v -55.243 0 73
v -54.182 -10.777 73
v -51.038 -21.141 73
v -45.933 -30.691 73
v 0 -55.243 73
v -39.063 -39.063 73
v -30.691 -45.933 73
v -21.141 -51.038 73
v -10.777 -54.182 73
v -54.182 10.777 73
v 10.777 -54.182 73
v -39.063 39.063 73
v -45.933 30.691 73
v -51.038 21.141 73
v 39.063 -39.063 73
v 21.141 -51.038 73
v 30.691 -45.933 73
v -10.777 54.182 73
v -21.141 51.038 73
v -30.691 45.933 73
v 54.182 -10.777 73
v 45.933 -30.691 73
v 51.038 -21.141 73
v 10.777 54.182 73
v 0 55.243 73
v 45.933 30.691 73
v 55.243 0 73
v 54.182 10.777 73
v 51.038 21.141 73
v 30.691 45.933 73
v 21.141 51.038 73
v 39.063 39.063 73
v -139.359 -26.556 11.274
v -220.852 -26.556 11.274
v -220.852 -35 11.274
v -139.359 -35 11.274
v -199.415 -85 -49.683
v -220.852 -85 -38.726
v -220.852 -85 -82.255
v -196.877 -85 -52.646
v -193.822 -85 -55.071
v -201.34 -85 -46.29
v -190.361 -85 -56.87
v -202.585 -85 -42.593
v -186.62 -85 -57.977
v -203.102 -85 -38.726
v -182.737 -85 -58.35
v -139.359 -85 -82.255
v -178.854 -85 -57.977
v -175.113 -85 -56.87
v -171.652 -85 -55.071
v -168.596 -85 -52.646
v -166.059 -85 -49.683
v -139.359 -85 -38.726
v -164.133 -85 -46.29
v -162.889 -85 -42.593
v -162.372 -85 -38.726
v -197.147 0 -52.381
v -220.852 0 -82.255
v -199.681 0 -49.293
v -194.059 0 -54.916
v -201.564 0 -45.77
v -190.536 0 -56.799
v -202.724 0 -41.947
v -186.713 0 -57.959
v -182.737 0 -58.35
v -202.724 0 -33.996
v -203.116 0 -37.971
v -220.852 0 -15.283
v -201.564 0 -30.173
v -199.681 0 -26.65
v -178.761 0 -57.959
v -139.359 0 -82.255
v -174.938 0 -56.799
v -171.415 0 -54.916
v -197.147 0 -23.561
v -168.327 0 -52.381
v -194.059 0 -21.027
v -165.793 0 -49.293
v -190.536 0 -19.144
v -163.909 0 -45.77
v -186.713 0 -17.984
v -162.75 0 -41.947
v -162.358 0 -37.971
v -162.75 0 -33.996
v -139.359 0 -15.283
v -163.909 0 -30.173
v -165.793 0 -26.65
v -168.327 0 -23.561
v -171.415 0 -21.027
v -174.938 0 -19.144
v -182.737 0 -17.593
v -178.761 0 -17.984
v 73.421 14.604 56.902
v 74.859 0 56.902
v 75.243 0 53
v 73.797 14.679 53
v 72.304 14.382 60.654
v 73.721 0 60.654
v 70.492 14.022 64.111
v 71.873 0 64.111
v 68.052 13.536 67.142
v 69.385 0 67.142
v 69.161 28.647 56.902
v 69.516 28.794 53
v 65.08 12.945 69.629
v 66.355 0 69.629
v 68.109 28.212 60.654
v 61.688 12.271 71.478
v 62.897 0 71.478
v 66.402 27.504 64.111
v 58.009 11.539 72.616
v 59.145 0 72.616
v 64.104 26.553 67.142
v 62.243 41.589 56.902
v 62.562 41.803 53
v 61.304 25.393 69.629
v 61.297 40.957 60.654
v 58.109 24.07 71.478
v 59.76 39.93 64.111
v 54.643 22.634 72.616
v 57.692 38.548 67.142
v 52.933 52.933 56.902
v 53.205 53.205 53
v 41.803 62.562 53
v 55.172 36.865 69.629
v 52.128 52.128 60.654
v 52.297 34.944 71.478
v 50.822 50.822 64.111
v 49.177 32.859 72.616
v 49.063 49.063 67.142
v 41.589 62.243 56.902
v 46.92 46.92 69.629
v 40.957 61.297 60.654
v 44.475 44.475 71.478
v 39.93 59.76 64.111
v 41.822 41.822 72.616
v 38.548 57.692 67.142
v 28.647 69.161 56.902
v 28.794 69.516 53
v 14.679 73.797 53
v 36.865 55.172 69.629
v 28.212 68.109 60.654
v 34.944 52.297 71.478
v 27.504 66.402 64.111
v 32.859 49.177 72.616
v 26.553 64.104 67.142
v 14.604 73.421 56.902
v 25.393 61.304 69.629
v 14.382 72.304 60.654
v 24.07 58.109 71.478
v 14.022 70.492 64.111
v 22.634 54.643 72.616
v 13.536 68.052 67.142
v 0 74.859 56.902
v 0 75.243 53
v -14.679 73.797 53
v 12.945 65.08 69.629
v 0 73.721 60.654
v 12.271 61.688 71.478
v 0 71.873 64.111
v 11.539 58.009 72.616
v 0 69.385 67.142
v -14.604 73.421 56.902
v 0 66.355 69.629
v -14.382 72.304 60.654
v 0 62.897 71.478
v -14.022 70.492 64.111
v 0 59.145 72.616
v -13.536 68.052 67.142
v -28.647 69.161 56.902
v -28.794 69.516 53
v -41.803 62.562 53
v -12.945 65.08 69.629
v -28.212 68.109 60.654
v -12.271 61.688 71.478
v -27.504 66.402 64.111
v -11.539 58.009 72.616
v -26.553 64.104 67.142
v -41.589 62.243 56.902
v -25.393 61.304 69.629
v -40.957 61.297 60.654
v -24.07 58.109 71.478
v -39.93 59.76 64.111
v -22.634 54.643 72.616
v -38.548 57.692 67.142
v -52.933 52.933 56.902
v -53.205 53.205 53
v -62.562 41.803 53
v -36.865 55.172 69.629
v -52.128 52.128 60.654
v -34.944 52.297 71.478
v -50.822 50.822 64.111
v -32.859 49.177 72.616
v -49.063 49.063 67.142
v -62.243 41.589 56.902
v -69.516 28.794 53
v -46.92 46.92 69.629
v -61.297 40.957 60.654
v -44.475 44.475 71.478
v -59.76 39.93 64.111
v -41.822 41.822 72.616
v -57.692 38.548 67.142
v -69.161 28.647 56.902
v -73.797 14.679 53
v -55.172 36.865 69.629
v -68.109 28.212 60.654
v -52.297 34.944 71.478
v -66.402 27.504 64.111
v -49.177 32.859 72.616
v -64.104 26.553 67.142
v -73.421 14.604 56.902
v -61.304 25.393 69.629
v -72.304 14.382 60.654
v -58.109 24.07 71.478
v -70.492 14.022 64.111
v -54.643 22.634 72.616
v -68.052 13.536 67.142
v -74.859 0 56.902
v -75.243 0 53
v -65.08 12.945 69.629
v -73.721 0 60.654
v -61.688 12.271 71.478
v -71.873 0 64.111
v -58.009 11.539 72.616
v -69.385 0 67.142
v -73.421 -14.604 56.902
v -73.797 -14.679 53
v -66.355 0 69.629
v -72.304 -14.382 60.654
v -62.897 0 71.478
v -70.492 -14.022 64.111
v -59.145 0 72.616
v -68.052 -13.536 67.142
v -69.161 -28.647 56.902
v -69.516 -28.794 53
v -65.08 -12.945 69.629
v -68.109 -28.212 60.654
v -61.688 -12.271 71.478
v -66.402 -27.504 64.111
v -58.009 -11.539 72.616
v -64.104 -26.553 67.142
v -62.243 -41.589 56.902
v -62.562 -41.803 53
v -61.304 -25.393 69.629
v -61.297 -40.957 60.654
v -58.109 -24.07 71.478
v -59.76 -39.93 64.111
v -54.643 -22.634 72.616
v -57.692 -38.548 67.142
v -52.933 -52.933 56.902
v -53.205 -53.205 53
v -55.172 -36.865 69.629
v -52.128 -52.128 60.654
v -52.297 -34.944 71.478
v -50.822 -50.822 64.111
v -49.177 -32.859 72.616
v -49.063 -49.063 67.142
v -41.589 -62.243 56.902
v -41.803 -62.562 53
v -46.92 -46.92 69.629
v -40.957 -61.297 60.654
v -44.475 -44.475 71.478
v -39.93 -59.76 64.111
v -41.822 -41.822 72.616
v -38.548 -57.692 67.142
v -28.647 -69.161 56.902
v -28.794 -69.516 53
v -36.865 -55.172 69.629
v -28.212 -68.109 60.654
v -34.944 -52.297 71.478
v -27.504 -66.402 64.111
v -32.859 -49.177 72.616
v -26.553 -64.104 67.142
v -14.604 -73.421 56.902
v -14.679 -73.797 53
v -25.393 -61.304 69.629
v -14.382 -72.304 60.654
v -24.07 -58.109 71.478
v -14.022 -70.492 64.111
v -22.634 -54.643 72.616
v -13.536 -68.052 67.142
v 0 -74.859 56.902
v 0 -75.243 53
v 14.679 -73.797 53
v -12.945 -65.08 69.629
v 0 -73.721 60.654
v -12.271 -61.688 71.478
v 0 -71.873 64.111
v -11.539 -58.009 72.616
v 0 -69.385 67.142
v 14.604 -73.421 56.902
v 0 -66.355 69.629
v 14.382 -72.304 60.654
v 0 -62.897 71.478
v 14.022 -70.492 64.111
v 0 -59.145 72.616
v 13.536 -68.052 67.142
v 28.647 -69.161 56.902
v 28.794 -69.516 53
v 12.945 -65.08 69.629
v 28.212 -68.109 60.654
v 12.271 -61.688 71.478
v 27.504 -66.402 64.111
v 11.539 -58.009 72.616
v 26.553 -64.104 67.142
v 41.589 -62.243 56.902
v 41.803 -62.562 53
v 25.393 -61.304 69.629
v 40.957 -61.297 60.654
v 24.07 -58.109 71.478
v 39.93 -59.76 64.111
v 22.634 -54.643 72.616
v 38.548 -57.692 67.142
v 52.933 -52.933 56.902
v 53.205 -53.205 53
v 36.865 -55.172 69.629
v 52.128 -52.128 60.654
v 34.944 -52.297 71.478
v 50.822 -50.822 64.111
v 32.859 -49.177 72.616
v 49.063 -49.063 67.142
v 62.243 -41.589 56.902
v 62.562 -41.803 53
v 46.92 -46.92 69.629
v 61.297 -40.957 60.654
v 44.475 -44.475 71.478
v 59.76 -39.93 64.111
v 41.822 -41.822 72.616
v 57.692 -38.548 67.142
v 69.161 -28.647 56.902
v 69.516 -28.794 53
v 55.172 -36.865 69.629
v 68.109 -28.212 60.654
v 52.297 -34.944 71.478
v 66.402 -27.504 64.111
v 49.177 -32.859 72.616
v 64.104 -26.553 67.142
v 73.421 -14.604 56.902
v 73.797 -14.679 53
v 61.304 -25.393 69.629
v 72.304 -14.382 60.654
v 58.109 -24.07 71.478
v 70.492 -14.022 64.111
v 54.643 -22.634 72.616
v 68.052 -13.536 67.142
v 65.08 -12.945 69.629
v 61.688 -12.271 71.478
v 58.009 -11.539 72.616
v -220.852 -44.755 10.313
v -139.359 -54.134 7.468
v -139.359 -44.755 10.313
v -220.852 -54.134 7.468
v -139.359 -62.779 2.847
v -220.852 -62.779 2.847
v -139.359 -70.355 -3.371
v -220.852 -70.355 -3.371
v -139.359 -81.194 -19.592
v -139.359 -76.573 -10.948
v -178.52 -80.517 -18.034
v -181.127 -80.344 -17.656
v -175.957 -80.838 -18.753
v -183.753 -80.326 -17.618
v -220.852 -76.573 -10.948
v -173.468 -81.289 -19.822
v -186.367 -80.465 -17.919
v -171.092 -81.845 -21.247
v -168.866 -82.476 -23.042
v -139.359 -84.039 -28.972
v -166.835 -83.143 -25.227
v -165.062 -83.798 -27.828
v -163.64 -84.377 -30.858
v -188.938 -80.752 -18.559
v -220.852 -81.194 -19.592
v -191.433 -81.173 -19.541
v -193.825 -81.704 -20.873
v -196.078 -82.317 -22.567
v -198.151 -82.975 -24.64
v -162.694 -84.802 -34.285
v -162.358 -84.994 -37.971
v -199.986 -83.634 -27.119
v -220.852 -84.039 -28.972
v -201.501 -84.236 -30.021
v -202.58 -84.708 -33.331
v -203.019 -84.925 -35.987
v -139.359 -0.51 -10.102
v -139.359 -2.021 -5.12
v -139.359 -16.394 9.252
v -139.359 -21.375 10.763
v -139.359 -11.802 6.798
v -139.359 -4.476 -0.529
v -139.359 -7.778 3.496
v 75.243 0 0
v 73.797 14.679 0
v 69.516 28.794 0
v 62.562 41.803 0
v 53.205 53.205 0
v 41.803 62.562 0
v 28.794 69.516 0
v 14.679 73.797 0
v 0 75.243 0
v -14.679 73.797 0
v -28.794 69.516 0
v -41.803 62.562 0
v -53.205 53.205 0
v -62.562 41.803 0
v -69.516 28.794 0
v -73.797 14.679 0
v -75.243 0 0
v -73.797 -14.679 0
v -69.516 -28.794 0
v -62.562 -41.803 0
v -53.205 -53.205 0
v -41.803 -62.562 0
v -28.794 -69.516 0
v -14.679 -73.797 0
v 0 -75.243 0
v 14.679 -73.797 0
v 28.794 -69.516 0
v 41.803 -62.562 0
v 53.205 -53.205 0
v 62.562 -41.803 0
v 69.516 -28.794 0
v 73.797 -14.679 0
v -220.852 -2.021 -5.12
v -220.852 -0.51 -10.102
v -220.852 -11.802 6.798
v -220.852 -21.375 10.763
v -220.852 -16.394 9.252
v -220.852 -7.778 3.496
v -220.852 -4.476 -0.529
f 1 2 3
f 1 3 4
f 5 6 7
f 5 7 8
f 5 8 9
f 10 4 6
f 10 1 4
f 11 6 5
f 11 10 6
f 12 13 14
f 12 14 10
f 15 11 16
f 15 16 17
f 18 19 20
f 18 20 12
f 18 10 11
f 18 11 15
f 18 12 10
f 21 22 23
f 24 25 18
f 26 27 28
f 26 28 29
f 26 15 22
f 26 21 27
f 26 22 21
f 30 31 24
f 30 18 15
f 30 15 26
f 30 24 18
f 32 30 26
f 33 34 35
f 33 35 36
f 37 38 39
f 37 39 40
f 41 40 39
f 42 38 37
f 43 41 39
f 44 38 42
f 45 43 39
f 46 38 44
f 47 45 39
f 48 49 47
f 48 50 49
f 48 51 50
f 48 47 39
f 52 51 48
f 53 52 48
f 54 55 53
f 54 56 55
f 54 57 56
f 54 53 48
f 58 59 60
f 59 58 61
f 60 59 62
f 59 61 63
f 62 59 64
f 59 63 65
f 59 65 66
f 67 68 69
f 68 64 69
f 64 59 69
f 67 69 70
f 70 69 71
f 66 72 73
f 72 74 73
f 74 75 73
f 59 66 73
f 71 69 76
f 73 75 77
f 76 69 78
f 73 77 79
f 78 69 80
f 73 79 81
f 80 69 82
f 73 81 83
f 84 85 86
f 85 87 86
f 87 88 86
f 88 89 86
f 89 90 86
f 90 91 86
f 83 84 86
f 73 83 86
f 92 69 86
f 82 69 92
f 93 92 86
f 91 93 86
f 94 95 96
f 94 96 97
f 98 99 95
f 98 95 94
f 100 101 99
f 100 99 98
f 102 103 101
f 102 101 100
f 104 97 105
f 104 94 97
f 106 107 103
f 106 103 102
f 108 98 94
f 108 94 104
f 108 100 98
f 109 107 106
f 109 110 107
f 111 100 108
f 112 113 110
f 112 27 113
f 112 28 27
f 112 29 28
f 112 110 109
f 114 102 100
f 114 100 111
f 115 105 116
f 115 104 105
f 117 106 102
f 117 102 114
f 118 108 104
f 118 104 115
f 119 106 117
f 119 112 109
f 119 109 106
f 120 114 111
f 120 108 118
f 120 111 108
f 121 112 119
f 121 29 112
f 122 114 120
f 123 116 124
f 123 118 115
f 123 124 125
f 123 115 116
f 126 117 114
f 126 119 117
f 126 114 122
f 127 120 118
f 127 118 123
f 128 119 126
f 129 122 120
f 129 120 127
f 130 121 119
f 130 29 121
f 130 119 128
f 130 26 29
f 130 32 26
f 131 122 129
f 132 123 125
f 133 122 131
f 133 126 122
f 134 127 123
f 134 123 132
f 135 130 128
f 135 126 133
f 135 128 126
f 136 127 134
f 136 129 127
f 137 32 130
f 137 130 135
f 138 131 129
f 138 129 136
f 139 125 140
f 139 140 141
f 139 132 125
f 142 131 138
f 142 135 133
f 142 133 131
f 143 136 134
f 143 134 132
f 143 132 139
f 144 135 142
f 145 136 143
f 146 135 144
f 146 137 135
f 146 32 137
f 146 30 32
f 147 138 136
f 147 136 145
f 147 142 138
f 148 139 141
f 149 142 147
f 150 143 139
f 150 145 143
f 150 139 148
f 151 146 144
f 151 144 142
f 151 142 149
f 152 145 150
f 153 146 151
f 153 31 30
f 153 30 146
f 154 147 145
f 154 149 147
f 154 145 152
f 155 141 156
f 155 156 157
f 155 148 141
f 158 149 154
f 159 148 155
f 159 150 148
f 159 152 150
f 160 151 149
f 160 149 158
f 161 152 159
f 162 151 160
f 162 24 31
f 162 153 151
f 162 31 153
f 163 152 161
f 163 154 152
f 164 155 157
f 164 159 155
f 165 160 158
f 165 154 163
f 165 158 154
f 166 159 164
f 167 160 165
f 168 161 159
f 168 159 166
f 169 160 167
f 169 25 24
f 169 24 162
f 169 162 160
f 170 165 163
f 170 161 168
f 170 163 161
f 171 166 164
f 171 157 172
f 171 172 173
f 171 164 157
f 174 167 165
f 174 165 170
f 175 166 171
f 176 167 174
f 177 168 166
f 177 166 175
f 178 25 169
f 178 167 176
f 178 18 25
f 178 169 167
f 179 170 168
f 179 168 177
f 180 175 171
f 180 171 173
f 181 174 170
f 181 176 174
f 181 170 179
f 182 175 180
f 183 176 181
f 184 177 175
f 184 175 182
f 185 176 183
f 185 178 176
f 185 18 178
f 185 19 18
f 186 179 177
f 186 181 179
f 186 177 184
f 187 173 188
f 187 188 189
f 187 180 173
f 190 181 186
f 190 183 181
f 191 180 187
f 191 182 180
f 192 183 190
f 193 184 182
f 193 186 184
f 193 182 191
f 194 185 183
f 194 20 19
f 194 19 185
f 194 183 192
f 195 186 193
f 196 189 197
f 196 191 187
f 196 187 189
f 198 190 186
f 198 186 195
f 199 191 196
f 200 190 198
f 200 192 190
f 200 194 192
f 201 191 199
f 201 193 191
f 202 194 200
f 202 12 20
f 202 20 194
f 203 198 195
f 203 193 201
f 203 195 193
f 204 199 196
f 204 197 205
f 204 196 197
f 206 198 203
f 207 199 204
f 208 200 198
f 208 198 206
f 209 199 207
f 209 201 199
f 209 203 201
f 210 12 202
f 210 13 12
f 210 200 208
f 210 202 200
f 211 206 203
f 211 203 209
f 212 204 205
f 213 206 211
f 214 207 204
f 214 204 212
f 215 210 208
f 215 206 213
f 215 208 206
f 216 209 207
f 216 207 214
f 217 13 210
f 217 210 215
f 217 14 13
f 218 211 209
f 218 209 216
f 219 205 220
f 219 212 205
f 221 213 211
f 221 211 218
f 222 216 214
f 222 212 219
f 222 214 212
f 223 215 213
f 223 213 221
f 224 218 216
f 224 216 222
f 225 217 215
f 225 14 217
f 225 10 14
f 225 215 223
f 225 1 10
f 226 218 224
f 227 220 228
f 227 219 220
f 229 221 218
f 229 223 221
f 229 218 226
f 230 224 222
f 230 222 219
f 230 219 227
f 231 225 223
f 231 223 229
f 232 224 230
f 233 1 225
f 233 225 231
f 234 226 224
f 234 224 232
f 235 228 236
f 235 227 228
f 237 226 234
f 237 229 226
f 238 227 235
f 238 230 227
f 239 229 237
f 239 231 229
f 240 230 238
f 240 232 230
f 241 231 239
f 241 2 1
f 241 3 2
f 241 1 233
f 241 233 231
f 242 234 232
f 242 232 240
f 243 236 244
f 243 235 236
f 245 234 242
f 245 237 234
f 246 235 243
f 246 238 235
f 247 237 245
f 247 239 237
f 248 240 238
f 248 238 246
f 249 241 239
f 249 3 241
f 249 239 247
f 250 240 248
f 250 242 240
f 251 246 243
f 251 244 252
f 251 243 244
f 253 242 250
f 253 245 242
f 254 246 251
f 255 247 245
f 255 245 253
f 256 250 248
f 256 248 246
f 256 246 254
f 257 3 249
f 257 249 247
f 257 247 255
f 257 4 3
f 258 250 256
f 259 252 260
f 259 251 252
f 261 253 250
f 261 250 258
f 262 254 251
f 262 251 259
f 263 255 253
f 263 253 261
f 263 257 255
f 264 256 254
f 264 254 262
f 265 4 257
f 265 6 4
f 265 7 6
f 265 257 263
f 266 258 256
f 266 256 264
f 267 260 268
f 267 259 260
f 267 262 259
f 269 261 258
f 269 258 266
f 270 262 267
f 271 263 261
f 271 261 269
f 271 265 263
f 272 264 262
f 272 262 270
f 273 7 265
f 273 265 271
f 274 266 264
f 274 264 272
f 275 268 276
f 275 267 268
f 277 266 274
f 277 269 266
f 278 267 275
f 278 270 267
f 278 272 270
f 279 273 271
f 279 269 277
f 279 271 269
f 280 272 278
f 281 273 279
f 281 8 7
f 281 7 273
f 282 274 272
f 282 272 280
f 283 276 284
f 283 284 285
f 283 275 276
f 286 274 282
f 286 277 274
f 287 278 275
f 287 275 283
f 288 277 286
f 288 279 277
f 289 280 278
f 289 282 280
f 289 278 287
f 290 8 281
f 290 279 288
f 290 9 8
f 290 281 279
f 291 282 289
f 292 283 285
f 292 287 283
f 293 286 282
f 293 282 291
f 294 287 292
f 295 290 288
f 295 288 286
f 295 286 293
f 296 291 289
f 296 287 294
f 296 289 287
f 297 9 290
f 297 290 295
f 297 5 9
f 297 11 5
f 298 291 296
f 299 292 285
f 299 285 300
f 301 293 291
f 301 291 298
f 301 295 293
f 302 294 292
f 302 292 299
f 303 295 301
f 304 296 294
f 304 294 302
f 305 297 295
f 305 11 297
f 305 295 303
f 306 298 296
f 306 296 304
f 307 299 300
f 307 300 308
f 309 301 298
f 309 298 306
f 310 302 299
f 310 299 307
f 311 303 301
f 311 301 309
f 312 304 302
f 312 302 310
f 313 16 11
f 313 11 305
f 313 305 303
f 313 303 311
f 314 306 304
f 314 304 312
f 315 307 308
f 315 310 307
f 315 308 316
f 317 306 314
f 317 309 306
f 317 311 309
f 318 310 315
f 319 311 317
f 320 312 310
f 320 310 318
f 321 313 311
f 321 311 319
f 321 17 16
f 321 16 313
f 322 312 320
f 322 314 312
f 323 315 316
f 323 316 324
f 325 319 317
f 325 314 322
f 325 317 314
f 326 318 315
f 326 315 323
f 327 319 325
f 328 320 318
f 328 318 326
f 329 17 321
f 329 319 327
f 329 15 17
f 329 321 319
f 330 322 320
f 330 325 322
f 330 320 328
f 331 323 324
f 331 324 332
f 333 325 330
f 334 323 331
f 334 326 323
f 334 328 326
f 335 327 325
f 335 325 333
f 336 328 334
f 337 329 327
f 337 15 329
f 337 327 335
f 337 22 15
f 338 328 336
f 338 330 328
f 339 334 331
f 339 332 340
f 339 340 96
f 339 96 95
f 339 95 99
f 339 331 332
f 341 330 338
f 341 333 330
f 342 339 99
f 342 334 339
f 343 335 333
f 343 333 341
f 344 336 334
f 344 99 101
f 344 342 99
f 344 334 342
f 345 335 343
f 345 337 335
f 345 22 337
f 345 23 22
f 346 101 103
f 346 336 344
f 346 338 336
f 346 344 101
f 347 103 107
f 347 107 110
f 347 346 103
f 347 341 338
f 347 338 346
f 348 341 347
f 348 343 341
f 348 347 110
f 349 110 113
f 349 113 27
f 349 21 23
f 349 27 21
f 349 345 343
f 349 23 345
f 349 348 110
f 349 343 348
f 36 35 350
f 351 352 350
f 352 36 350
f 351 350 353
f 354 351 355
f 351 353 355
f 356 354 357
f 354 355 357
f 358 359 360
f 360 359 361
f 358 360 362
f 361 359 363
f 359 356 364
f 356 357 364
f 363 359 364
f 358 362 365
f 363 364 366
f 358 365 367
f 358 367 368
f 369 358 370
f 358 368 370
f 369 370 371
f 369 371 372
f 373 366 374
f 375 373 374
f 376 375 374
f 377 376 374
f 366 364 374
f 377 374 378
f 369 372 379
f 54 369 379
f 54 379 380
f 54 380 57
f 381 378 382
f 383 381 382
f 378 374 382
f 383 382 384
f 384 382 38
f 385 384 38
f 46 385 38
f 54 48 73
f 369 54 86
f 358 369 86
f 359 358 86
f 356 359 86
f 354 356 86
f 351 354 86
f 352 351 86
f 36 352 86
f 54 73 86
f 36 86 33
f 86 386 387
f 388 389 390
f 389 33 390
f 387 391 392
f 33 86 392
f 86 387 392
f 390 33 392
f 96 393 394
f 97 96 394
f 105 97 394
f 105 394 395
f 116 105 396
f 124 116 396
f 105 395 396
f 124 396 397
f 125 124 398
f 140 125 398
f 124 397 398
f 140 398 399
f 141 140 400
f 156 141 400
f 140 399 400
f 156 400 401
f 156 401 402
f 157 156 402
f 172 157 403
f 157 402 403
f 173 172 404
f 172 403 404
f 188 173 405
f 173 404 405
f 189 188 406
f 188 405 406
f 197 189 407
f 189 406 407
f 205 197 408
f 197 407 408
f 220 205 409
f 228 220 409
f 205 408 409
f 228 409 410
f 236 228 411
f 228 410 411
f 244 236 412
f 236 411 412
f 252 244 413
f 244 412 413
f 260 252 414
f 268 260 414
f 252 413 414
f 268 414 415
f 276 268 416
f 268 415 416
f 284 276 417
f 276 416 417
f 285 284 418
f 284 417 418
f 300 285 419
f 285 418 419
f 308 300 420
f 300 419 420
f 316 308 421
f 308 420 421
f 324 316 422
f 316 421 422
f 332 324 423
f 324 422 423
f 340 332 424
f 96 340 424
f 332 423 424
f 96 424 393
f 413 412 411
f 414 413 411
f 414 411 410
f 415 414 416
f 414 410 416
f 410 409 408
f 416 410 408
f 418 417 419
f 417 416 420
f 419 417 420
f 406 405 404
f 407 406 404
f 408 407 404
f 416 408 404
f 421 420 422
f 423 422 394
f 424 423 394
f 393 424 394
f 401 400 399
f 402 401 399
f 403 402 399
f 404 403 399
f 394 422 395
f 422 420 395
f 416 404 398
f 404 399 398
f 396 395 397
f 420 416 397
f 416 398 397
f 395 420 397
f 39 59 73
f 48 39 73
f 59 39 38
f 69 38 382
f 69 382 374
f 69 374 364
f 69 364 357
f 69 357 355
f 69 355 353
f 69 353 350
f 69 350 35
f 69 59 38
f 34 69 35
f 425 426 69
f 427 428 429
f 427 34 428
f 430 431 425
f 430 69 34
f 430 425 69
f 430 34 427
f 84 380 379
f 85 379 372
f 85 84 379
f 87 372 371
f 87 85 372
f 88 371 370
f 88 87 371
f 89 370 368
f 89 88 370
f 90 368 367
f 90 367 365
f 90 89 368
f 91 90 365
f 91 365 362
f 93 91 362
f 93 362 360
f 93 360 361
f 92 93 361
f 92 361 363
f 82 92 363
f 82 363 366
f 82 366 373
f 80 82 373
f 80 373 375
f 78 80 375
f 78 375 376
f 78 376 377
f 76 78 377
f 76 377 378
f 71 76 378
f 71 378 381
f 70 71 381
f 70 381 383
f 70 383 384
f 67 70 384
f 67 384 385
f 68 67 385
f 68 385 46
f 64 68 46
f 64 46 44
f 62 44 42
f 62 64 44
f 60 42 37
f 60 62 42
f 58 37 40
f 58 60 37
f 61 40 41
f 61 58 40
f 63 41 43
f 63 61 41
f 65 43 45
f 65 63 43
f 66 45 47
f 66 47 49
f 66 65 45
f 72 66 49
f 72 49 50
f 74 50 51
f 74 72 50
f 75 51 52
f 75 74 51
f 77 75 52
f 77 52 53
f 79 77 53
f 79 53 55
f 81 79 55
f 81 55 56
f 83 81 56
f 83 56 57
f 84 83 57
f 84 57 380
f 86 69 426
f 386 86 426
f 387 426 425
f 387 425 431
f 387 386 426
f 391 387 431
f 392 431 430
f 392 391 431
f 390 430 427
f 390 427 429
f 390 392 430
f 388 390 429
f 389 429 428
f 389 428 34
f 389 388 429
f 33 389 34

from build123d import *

# Parameters (mm, degrees)
F0_R        = 75.2432025663
F1_DEPTH    = 73
F2_W        = 81.4927220345
F2_H        = 93.5291722417
F2_R        = 20.3787621881
F3_DEPTH    = 85
F4_T1_DEPTH = 331.4927220345
F5_R        = 26.5563491861
F6_R        = 20


# Not quite as in the source:
# - a fillet or chamfer that OpenCascade refuses, or shapes differently, is made with other operations: its cross-section is extruded or revolved along the edge and cut away or added


with BuildPart() as f1:
    # F0 (on Top) → F1 (new body)
    with BuildSketch(Plane.XY):
        Circle(F0_R)
    extrude(amount=F1_DEPTH)

    # F6
    f6_edges = [f1.edges().sort_by_distance(p)[0] for p in [
        (-75.243203, 0, 73),
    ]]
    fillet(f6_edges, radius=F6_R)


with BuildPart() as f3:
    # F2 (on Front) → F3 (new body)
    with BuildSketch(Plane.XZ):
        with Locations((-180.1057755947, -35.4908742011)):
            Rectangle(F2_W, F2_H)
        with Locations((-182.736903429, -37.9713438451)):
            Circle(F2_R, mode=Mode.SUBTRACT)
    extrude(amount=F3_DEPTH)

    # F4: fillet of radius 50 on 1 edges, made by hand

    # F4_s2 → F4_t1 (cut)
    with BuildSketch(Plane.YZ.offset(-345.8521366119)):
        with BuildLine():
            ThreePointArc((-35, 11.2737119198), (-70.3553390593, -3.3709490209), (-85, -38.7262880802))
            Line((-85, -38.7262880802), (-85, 11.2737119198))
            Line((-85, 11.2737119198), (-35, 11.2737119198))
        make_face()
    extrude(amount=F4_T1_DEPTH, mode=Mode.SUBTRACT)

    # F5
    f5_edges = [f3.edges().sort_by_distance(p)[0] for p in [
        (-180.105776, 0, 11.273712),
    ]]
    fillet(f5_edges, radius=F5_R)


solid = Compound([f1.part, f3.part])
